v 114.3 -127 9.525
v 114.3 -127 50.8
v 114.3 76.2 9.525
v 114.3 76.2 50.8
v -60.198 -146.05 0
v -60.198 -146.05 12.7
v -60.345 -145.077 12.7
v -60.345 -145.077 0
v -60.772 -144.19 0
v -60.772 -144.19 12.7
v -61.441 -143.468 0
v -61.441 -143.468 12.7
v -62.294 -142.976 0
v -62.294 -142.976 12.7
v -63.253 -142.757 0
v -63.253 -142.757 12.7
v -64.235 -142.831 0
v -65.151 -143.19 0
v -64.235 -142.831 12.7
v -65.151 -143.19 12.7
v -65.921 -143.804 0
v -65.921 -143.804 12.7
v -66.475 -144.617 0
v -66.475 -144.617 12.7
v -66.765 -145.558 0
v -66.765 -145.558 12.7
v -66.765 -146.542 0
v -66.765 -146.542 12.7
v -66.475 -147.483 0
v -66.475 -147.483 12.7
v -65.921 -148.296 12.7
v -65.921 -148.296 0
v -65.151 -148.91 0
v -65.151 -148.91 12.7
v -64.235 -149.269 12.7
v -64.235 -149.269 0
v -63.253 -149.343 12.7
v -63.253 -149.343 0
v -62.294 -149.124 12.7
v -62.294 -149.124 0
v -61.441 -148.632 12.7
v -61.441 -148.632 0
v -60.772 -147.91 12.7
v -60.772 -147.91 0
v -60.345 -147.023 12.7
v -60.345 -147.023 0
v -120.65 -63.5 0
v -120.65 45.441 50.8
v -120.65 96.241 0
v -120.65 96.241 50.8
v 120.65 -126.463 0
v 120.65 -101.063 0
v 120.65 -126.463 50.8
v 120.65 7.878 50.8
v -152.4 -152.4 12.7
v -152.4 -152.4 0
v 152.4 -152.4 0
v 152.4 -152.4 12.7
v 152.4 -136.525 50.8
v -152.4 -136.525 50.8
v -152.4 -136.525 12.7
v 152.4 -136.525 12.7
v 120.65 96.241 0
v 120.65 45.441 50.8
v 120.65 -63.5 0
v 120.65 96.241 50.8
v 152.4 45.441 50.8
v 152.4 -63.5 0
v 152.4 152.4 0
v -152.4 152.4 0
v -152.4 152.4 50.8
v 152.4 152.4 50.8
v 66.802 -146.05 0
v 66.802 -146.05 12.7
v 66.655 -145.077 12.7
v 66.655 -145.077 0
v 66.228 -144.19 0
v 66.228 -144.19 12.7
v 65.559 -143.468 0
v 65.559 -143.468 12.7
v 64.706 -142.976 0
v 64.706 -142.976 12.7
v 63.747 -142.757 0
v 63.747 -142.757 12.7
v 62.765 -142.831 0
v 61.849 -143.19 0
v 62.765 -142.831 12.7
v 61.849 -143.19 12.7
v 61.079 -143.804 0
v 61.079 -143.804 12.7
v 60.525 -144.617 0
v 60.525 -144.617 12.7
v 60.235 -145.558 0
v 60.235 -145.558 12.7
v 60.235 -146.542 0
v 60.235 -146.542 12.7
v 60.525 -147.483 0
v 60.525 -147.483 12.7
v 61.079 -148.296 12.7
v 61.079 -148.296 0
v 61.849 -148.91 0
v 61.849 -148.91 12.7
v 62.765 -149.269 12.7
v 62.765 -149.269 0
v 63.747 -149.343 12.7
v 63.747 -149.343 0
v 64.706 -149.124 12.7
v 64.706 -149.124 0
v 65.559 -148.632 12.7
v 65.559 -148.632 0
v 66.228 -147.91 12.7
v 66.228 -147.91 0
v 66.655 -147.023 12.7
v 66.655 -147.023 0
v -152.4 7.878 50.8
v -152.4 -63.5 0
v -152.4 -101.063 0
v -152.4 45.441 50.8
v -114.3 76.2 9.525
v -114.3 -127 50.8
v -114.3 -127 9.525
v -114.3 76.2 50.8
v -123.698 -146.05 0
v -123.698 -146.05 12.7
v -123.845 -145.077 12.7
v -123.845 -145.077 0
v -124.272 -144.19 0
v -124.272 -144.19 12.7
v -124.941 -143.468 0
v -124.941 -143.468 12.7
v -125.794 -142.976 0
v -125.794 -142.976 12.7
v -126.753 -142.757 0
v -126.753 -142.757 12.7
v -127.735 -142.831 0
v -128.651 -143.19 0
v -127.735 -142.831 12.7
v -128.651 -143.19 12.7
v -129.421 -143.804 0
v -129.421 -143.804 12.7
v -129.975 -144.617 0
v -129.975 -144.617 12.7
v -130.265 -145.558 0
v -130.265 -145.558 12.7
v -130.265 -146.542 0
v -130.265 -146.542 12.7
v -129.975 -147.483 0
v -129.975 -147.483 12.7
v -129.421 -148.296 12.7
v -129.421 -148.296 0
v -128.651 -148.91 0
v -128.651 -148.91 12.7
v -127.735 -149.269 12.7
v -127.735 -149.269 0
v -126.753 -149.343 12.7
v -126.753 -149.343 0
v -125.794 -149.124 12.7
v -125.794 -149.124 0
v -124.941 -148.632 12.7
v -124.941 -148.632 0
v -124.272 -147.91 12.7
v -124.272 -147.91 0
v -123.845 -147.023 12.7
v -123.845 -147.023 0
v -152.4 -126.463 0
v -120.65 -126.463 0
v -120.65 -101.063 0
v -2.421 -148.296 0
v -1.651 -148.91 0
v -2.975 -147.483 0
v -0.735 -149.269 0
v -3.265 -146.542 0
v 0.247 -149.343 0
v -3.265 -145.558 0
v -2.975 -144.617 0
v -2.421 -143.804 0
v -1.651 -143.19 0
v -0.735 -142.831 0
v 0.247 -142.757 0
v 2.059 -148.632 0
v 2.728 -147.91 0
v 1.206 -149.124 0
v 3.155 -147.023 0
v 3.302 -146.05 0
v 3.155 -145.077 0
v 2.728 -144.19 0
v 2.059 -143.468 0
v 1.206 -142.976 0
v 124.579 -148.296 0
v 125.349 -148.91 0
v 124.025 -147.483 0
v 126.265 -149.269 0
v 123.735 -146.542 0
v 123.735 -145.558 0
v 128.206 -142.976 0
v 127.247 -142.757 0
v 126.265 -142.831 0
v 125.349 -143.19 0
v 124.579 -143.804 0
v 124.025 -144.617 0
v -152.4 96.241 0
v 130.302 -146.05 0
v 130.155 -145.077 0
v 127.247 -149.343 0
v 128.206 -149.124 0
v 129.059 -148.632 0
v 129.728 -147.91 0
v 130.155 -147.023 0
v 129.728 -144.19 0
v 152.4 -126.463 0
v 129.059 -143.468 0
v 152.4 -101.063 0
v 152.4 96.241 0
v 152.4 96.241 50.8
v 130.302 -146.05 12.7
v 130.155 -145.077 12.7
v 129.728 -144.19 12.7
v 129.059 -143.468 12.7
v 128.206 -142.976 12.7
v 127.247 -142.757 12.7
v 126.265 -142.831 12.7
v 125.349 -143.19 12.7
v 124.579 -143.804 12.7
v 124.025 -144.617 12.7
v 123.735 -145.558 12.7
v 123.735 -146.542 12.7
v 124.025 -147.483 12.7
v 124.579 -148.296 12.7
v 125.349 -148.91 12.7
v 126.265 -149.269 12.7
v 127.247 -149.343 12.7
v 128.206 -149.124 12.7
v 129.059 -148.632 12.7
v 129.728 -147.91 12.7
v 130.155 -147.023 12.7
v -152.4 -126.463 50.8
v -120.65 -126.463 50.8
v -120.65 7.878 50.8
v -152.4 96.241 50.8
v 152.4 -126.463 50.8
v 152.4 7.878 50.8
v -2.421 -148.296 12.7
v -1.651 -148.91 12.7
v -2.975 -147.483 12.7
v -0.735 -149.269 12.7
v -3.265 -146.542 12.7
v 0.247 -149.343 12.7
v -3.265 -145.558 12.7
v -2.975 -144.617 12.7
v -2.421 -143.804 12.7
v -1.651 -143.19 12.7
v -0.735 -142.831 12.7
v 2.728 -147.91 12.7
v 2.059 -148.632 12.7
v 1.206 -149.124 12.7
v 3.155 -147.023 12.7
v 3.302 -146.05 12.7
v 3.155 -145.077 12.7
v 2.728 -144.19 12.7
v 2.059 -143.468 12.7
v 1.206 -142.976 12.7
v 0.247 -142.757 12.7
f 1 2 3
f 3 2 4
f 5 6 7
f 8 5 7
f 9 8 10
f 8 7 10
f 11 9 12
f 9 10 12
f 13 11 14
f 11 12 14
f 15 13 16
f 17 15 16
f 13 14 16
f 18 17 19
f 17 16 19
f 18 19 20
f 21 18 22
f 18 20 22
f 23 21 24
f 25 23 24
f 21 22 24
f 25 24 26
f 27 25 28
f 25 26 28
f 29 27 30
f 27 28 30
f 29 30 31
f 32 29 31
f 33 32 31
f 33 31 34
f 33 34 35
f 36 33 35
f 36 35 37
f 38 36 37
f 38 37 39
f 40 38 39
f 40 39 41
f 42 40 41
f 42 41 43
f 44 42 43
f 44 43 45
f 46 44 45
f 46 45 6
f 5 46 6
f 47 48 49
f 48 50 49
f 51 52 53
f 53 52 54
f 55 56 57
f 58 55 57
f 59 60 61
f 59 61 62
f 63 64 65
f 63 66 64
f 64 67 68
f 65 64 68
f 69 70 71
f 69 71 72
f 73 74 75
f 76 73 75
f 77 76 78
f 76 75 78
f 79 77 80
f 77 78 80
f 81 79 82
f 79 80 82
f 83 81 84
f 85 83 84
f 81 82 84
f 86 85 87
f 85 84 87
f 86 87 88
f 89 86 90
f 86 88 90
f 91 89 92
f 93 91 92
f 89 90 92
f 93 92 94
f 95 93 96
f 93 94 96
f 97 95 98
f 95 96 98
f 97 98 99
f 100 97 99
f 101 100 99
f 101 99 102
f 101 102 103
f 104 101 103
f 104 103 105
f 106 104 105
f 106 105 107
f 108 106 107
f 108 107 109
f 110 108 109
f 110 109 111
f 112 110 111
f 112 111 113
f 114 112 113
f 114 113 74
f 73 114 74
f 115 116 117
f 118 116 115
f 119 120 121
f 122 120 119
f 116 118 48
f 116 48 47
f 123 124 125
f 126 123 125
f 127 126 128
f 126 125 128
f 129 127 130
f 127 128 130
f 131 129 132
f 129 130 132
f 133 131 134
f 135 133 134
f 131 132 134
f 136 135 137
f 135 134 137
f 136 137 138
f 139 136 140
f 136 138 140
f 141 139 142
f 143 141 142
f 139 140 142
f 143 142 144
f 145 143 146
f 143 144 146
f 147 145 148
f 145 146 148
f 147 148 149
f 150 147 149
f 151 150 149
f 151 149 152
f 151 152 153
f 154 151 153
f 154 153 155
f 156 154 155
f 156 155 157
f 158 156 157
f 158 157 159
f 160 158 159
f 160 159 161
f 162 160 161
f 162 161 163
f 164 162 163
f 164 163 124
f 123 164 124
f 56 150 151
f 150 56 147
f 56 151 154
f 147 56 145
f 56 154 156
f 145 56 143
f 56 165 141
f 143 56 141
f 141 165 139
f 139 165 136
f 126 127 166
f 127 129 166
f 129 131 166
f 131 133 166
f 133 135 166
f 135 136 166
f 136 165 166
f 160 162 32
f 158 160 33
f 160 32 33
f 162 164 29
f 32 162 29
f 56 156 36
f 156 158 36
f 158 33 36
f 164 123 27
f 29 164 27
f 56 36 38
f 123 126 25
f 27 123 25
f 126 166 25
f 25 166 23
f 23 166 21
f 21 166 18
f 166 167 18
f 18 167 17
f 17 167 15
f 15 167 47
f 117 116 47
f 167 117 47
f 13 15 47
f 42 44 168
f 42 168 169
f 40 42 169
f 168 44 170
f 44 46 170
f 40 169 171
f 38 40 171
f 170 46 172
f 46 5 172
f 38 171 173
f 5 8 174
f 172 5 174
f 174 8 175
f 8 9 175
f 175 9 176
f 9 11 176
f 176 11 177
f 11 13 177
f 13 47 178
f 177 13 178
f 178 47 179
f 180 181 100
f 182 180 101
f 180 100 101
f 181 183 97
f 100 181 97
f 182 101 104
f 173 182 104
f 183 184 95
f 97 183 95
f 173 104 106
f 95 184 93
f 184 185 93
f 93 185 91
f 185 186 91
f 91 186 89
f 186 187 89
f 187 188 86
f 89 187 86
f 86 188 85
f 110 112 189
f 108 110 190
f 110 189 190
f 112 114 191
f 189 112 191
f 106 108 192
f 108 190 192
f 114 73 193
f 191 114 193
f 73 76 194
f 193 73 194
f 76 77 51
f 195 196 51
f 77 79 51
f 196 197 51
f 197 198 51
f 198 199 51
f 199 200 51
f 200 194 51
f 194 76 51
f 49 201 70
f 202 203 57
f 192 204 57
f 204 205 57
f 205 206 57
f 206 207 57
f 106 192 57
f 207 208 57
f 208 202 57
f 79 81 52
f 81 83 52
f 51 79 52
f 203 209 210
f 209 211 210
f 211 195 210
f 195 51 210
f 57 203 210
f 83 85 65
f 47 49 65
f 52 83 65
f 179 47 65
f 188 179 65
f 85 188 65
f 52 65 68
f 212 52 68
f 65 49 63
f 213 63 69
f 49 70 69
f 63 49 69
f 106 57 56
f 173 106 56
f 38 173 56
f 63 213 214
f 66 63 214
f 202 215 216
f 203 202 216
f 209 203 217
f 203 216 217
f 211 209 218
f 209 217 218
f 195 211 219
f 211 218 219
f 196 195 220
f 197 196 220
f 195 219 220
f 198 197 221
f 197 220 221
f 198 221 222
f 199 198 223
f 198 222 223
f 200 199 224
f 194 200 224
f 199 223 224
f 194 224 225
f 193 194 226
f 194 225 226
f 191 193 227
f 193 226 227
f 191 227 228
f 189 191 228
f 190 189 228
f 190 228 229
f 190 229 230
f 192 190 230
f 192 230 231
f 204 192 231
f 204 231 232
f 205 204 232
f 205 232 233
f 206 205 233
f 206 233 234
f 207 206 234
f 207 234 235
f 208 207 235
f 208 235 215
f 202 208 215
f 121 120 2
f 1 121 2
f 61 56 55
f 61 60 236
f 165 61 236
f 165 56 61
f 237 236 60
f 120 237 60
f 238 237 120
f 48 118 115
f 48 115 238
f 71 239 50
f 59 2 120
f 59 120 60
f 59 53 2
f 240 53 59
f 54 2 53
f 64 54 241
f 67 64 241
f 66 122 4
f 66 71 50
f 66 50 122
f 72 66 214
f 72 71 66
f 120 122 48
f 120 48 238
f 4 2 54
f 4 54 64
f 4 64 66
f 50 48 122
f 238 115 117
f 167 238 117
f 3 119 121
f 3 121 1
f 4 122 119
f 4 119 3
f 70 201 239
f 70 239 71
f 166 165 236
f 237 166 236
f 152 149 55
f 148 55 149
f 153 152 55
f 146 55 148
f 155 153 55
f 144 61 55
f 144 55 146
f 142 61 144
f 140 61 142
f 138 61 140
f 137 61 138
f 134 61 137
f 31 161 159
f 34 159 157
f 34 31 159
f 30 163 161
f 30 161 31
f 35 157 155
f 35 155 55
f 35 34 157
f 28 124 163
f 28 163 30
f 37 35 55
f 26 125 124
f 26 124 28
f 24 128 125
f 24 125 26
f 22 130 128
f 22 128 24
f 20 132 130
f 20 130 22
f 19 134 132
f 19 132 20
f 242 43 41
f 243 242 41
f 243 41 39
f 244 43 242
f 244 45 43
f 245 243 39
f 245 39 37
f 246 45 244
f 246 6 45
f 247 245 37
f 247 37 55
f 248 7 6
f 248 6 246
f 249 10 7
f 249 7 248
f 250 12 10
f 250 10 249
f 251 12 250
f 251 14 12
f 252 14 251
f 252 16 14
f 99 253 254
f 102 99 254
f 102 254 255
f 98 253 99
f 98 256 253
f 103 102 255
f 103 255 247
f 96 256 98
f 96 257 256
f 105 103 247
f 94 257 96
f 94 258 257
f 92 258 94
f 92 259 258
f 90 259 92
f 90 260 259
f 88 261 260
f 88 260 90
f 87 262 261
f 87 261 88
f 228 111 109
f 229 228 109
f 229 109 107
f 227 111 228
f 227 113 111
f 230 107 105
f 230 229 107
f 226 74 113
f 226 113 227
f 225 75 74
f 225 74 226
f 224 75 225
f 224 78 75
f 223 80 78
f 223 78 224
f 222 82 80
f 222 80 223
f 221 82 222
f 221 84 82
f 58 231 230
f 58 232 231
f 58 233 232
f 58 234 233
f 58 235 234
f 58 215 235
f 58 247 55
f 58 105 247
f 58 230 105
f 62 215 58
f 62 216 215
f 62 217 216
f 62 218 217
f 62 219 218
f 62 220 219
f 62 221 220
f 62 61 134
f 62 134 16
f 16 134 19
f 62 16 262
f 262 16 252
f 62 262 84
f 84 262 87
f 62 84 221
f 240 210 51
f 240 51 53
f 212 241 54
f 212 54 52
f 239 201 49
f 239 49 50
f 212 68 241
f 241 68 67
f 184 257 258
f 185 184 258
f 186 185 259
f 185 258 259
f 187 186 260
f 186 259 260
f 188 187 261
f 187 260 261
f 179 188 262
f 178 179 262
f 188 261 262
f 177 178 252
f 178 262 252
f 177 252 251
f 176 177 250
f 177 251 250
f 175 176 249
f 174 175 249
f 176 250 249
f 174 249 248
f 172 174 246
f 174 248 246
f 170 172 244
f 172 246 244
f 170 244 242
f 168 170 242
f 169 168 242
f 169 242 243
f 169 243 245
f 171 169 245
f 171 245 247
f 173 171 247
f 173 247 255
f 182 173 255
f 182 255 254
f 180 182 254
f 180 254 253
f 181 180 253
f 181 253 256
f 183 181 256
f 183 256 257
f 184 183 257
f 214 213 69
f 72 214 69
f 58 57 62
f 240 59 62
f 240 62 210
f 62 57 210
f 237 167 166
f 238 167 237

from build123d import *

# Parameters (mm, degrees)
SKETCH1_W                  = 304.8
SKETCH1_H                  = 304.8
BLANK_DEPTH                = 50.8
SKETCH2_W                  = 228.6
SKETCH2_H                  = 203.2
ROUGH_BATTERY_CAVITY_DEPTH = 41.275
SKETCH3_W                  = 304.8
SKETCH3_H                  = 15.875
BUMPER_RAIL_DEPTH          = 38.1
SKETCH4_R                  = 3.302
BUMPER_RAIL_HOLES_DEPTH    = 219.867836833
DRIVE_MOTOR_RAIL_DEPTH     = 31.75


with BuildPart() as part:
    # Sketch1 → Blank (new body)
    with BuildSketch(Plane.XY):
        Rectangle(SKETCH1_W, SKETCH1_H)
    extrude(amount=BLANK_DEPTH)

    # Sketch2 → Rough battery cavity (cut)
    with BuildSketch(Plane.XY.offset(50.8)):
        with Locations((0, -25.4)):
            Rectangle(SKETCH2_W, SKETCH2_H)
    extrude(amount=-ROUGH_BATTERY_CAVITY_DEPTH, mode=Mode.SUBTRACT)

    # Sketch3 → Bumper rail (cut)
    with BuildSketch(Plane.XY.offset(50.8)):
        with Locations((0, -144.4625)):
            Rectangle(SKETCH3_W, SKETCH3_H)
    extrude(amount=-BUMPER_RAIL_DEPTH, mode=Mode.SUBTRACT)

    # Sketch4 → Bumper rail holes (cut, through all)
    with BuildSketch(Plane.XY.offset(12.7)):
        with Locations((-127, -146.05)):
            Circle(SKETCH4_R)
        with Locations((127, -146.05)):
            Circle(SKETCH4_R)
        with Locations((-63.5, -146.05)):
            Circle(SKETCH4_R)
        with Locations((0, -146.05)):
            Circle(SKETCH4_R)
        with Locations((63.5, -146.05)):
            Circle(SKETCH4_R)
    extrude(amount=-BUMPER_RAIL_HOLES_DEPTH, mode=Mode.SUBTRACT)

    # Sketch5 → Drive motor rail (cut)
    with BuildSketch(Plane(origin=(152.4, 0, 0), x_dir=(0, 0, -1), z_dir=(1, 0, 0))):
        Polygon((-50.8, 45.440951562), (0, -63.5), (0, 96.240951562), (-50.8, 96.240951562), align=None)
        Polygon((-50.8, 7.877501429), (0, -101.063450133), (0, -126.463450133), (-50.8, -126.463450133), align=None)
    drive_motor_rail = extrude(amount=-DRIVE_MOTOR_RAIL_DEPTH, mode=Mode.SUBTRACT)

    # Drive motor rail mirror: Drive motor rail across plane
    add(drive_motor_rail.mirror(Plane(origin=(0, 0, 0), x_dir=(0, 0, 1), z_dir=(1, 0, 0))), mode=Mode.SUBTRACT)


solid = part.part
